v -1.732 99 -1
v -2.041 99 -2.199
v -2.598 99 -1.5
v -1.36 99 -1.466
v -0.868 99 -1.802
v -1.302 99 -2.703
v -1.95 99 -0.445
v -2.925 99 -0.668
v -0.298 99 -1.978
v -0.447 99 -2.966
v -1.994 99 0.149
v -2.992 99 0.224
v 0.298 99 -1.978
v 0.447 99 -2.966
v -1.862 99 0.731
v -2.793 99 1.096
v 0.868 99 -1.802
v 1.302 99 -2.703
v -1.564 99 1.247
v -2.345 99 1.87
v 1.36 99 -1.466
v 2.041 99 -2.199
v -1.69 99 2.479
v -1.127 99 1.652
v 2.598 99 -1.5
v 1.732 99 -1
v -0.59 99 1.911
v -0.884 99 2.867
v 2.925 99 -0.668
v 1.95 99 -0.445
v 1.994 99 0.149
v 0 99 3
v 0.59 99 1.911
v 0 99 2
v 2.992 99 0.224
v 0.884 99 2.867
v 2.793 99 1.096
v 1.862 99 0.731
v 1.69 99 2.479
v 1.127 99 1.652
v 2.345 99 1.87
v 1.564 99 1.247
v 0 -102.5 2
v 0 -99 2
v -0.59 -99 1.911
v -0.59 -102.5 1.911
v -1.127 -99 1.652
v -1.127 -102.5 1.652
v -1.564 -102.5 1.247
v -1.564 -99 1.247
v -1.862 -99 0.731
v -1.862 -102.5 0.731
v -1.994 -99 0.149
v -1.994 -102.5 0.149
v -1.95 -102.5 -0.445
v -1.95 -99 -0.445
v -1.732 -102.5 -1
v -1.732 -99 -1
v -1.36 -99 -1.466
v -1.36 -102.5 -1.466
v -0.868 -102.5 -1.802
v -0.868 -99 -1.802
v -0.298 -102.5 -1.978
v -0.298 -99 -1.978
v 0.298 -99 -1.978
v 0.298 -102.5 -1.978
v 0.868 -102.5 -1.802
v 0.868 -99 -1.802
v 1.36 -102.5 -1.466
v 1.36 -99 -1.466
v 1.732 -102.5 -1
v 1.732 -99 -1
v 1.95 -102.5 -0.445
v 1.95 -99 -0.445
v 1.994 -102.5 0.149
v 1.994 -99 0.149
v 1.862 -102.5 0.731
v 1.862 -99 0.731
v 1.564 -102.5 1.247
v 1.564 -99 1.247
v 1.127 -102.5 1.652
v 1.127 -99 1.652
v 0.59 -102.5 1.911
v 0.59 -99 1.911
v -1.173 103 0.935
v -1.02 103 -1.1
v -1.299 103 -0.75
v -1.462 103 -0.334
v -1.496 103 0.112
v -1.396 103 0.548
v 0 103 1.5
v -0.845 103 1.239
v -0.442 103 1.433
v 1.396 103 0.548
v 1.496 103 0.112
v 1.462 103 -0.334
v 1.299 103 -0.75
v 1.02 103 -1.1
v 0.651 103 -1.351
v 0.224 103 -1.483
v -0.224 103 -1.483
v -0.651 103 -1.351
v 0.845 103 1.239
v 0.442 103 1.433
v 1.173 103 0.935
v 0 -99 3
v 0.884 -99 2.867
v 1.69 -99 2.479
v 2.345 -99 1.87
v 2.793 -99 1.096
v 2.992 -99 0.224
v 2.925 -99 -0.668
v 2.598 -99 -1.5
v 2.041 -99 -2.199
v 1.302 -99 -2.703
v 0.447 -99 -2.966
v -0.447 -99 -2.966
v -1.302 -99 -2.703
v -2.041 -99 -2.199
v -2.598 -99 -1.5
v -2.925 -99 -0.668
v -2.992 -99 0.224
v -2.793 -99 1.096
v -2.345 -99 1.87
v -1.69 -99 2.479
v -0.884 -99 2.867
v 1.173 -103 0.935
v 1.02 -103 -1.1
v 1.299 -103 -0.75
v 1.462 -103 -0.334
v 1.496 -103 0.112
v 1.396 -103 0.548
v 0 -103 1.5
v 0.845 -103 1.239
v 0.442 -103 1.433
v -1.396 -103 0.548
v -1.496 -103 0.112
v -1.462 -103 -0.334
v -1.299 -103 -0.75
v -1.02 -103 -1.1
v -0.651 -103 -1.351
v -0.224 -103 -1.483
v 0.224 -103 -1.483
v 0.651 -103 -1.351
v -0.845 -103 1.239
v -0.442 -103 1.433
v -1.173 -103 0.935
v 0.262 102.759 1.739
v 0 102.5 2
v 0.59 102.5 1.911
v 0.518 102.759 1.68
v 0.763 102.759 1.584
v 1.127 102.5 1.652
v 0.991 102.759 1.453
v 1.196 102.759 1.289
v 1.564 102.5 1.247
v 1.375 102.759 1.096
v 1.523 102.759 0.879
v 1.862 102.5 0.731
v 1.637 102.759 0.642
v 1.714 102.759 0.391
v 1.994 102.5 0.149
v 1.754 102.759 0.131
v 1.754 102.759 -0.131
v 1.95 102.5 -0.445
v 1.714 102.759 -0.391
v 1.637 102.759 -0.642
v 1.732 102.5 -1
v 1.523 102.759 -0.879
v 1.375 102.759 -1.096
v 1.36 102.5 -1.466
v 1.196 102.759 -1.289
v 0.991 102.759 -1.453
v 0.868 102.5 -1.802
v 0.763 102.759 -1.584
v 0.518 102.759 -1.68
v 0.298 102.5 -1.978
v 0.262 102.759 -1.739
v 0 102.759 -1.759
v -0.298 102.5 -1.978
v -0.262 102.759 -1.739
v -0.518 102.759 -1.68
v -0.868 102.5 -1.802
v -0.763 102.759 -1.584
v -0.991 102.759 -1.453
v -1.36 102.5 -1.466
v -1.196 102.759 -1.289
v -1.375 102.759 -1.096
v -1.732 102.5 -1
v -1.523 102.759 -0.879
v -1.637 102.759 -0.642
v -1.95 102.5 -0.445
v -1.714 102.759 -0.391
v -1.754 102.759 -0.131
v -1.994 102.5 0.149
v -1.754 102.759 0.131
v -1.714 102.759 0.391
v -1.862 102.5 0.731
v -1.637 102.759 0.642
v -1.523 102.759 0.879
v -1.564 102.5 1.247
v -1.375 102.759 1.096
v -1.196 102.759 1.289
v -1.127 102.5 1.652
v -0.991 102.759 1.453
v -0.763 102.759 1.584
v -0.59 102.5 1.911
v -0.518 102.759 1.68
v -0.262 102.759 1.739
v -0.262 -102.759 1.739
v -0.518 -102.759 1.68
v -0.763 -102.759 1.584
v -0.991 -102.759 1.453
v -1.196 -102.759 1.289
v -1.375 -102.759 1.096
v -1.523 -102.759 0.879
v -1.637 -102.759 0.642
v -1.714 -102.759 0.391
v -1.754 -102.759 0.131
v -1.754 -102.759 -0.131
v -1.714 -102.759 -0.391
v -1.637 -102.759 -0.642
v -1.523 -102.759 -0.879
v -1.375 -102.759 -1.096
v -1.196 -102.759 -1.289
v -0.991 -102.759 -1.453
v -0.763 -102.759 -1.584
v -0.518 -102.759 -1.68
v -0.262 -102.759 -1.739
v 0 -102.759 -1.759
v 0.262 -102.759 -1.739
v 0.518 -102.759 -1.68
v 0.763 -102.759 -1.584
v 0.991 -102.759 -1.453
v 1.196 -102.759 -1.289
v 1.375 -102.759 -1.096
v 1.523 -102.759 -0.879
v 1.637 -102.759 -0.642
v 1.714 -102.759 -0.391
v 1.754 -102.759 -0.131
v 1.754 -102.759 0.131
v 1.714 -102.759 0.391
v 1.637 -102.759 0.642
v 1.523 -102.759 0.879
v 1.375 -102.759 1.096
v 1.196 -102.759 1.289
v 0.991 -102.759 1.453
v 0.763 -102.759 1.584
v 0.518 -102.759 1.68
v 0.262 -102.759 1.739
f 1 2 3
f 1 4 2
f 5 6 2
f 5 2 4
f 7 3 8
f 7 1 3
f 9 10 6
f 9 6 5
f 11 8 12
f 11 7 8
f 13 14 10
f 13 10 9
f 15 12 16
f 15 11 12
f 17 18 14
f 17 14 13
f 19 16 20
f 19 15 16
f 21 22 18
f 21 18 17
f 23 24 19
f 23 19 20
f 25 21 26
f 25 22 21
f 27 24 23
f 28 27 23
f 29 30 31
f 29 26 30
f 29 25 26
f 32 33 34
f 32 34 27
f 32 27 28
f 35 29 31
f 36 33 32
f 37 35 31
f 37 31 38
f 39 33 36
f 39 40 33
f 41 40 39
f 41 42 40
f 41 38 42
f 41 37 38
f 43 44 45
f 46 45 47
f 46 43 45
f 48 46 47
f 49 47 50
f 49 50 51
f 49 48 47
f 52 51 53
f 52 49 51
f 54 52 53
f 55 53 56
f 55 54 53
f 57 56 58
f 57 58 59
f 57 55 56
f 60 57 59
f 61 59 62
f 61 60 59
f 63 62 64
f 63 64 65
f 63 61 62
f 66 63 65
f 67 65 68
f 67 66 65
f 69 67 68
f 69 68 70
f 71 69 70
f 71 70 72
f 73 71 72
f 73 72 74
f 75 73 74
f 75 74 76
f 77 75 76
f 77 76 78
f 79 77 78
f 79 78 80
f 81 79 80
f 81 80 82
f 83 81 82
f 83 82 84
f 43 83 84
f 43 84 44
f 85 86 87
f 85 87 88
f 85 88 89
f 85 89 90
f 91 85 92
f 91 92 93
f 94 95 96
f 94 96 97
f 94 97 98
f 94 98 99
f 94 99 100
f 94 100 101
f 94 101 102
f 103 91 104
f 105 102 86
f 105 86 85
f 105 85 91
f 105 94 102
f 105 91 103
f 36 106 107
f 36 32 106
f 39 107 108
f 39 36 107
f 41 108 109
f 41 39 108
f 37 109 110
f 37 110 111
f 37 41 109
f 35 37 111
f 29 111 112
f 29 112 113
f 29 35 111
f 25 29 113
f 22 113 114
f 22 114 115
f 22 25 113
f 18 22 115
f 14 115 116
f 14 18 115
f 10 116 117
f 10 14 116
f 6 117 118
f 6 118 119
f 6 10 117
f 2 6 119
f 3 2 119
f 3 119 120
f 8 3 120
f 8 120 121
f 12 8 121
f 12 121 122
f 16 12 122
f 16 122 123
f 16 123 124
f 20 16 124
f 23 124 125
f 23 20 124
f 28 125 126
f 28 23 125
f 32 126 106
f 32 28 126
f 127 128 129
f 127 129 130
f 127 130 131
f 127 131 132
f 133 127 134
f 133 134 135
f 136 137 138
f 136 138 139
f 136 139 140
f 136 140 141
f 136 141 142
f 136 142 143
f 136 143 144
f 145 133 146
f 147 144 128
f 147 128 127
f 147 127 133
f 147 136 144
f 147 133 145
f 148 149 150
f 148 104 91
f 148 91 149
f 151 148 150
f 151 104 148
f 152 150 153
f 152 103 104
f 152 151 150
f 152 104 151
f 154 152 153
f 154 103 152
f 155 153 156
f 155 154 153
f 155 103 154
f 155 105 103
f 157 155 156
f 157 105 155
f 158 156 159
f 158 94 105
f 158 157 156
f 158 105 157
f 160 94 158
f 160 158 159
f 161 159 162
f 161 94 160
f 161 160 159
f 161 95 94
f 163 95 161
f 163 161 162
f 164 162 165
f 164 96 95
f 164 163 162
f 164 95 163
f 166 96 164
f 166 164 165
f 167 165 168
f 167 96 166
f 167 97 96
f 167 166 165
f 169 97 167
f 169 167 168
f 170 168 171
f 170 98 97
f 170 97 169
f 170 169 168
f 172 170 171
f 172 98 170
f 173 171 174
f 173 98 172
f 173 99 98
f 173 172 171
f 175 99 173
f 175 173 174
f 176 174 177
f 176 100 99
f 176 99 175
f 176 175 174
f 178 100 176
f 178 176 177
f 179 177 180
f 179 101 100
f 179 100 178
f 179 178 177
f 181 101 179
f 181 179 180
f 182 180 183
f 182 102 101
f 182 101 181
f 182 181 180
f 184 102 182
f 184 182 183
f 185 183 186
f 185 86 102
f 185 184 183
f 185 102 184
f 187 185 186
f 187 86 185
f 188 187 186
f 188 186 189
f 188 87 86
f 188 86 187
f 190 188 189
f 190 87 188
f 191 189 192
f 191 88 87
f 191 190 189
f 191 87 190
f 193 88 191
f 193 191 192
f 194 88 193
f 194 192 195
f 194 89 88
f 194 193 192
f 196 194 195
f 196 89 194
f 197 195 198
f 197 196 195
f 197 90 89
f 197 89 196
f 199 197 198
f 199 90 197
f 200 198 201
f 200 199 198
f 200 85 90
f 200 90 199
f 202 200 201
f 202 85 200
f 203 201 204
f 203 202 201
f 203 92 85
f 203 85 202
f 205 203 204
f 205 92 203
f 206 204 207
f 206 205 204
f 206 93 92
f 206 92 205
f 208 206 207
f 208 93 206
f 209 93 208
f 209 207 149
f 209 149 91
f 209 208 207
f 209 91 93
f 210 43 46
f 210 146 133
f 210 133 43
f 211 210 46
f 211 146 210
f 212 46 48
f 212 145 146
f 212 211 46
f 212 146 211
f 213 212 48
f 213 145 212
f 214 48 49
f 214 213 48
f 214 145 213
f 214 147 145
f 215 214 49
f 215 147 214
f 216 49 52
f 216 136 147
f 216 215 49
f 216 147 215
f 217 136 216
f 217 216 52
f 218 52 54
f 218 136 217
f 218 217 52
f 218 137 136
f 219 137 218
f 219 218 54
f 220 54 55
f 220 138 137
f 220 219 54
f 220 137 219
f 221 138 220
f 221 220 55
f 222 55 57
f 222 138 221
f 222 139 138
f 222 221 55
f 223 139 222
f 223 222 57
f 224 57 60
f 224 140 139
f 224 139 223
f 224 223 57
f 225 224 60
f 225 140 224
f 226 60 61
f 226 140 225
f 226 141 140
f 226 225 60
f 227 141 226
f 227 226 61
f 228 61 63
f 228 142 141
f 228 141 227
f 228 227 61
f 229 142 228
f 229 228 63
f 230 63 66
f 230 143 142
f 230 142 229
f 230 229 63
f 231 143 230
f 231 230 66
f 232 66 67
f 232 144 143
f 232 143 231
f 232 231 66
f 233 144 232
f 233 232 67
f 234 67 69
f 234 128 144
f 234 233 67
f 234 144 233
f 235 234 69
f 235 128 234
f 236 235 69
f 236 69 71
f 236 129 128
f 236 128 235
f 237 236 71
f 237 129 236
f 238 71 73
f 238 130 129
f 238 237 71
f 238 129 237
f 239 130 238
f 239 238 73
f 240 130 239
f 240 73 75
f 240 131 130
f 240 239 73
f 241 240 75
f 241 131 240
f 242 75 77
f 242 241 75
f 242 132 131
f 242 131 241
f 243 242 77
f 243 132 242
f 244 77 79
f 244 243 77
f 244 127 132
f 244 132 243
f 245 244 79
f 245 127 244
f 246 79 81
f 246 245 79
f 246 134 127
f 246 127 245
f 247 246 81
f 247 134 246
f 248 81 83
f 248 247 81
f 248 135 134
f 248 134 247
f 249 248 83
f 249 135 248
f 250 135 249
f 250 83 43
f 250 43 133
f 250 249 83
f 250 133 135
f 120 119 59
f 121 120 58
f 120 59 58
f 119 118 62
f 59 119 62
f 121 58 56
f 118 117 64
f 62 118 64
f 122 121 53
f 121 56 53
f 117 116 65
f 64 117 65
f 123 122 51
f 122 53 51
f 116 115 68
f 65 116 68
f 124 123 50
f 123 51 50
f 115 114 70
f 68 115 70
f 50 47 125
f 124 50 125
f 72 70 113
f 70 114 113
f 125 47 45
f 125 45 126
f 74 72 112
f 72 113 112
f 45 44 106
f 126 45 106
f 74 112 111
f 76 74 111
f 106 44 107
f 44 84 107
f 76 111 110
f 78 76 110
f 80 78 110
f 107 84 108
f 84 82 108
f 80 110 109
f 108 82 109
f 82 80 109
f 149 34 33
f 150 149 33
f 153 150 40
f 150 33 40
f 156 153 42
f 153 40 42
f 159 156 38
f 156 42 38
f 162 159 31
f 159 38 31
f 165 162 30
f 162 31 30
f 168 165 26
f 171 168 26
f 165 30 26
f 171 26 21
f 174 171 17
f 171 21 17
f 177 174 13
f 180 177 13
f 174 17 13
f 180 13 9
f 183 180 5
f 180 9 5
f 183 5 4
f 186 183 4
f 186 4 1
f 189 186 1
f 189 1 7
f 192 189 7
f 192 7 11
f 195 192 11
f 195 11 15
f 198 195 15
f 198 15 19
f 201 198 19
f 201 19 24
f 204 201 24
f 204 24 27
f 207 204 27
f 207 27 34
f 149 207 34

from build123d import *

# Parameters (mm, degrees)
IZIM1_R                     = 3
Y_KSEKLIK_EKSTR_ZYON6_DEPTH = 99
IZIM2_R                     = 2
Y_KSEKLIK_EKSTR_ZYON7_DEPTH = 4
RADYUS1_SIZE                = 0.5
Y_KSEKLIK_EKSTR_ZYON8_START = 4
IZIM5_R                     = 2
Y_KSEKLIK_EKSTR_ZYON8_DEPTH = 4
RADYUS2_SIZE                = 0.5


with BuildPart() as part:
    # Çizim1 → Yükseklik-Ekstrüzyon6 (new, symmetric)
    with BuildSketch(Plane(origin=(0, 0, 0), x_dir=(1, 0, 0), z_dir=(0, 1, 0))):
        with Locations(Location((0, 0, 0), (0, 0, 270))):
            Circle(IZIM1_R)
    extrude(amount=Y_KSEKLIK_EKSTR_ZYON6_DEPTH, both=True)

    # Çizim2 → Yükseklik-Ekstrüzyon7 (add)
    with BuildSketch(Plane(origin=(0, 99, 0), x_dir=(1, 0, 0), z_dir=(0, 1, 0))):
        with Locations(Location((0, 0, 0), (0, 0, 270))):
            Circle(IZIM2_R)
    extrude(amount=Y_KSEKLIK_EKSTR_ZYON7_DEPTH)

    # Radyus1
    # a fillet whose section is not a circle: 0.5 mm, written as the material it takes off along each edge
    with BuildSketch(Plane(origin=(0, 103, 0), x_dir=(0, 0, 1), z_dir=(-1, 0, 0))) as radyus1_piece_1:
        with BuildLine():
            Bezier((2, -RADYUS1_SIZE), (2, 0), (2 - RADYUS1_SIZE, 0), weights=[1, 0.035355339, 1])
            Line((2 - RADYUS1_SIZE, 0), (2, 0))
            Line((2, 0), (2, -RADYUS1_SIZE))
        make_face()
    revolve(axis=Axis((0, 103, 0), (0, 1, 0)), mode=Mode.SUBTRACT)

    # Çizim5 → Yükseklik-Ekstrüzyon8 (add)
    with BuildSketch(Plane.XZ.offset(99).offset(Y_KSEKLIK_EKSTR_ZYON8_START)):
        with Locations(Location((0, 0, 0), (0, 0, 90))):
            Circle(IZIM5_R)
    extrude(amount=-Y_KSEKLIK_EKSTR_ZYON8_DEPTH)

    # Radyus2
    # a fillet whose section is not a circle: 0.5 mm, written as the material it takes off along each edge
    with BuildSketch(Plane(origin=(0, -103, 0), x_dir=(0, 0, 1), z_dir=(1, 0, 0))) as radyus2_piece_1:
        with BuildLine():
            Bezier((2, -RADYUS2_SIZE), (2, 0), (2 - RADYUS2_SIZE, 0), weights=[1, 0.035355339, 1])
            Line((2 - RADYUS2_SIZE, 0), (2, 0))
            Line((2, 0), (2, -RADYUS2_SIZE))
        make_face()
    revolve(axis=Axis((0, -103, 0), (0, -1, 0)), mode=Mode.SUBTRACT)


solid = part.part
